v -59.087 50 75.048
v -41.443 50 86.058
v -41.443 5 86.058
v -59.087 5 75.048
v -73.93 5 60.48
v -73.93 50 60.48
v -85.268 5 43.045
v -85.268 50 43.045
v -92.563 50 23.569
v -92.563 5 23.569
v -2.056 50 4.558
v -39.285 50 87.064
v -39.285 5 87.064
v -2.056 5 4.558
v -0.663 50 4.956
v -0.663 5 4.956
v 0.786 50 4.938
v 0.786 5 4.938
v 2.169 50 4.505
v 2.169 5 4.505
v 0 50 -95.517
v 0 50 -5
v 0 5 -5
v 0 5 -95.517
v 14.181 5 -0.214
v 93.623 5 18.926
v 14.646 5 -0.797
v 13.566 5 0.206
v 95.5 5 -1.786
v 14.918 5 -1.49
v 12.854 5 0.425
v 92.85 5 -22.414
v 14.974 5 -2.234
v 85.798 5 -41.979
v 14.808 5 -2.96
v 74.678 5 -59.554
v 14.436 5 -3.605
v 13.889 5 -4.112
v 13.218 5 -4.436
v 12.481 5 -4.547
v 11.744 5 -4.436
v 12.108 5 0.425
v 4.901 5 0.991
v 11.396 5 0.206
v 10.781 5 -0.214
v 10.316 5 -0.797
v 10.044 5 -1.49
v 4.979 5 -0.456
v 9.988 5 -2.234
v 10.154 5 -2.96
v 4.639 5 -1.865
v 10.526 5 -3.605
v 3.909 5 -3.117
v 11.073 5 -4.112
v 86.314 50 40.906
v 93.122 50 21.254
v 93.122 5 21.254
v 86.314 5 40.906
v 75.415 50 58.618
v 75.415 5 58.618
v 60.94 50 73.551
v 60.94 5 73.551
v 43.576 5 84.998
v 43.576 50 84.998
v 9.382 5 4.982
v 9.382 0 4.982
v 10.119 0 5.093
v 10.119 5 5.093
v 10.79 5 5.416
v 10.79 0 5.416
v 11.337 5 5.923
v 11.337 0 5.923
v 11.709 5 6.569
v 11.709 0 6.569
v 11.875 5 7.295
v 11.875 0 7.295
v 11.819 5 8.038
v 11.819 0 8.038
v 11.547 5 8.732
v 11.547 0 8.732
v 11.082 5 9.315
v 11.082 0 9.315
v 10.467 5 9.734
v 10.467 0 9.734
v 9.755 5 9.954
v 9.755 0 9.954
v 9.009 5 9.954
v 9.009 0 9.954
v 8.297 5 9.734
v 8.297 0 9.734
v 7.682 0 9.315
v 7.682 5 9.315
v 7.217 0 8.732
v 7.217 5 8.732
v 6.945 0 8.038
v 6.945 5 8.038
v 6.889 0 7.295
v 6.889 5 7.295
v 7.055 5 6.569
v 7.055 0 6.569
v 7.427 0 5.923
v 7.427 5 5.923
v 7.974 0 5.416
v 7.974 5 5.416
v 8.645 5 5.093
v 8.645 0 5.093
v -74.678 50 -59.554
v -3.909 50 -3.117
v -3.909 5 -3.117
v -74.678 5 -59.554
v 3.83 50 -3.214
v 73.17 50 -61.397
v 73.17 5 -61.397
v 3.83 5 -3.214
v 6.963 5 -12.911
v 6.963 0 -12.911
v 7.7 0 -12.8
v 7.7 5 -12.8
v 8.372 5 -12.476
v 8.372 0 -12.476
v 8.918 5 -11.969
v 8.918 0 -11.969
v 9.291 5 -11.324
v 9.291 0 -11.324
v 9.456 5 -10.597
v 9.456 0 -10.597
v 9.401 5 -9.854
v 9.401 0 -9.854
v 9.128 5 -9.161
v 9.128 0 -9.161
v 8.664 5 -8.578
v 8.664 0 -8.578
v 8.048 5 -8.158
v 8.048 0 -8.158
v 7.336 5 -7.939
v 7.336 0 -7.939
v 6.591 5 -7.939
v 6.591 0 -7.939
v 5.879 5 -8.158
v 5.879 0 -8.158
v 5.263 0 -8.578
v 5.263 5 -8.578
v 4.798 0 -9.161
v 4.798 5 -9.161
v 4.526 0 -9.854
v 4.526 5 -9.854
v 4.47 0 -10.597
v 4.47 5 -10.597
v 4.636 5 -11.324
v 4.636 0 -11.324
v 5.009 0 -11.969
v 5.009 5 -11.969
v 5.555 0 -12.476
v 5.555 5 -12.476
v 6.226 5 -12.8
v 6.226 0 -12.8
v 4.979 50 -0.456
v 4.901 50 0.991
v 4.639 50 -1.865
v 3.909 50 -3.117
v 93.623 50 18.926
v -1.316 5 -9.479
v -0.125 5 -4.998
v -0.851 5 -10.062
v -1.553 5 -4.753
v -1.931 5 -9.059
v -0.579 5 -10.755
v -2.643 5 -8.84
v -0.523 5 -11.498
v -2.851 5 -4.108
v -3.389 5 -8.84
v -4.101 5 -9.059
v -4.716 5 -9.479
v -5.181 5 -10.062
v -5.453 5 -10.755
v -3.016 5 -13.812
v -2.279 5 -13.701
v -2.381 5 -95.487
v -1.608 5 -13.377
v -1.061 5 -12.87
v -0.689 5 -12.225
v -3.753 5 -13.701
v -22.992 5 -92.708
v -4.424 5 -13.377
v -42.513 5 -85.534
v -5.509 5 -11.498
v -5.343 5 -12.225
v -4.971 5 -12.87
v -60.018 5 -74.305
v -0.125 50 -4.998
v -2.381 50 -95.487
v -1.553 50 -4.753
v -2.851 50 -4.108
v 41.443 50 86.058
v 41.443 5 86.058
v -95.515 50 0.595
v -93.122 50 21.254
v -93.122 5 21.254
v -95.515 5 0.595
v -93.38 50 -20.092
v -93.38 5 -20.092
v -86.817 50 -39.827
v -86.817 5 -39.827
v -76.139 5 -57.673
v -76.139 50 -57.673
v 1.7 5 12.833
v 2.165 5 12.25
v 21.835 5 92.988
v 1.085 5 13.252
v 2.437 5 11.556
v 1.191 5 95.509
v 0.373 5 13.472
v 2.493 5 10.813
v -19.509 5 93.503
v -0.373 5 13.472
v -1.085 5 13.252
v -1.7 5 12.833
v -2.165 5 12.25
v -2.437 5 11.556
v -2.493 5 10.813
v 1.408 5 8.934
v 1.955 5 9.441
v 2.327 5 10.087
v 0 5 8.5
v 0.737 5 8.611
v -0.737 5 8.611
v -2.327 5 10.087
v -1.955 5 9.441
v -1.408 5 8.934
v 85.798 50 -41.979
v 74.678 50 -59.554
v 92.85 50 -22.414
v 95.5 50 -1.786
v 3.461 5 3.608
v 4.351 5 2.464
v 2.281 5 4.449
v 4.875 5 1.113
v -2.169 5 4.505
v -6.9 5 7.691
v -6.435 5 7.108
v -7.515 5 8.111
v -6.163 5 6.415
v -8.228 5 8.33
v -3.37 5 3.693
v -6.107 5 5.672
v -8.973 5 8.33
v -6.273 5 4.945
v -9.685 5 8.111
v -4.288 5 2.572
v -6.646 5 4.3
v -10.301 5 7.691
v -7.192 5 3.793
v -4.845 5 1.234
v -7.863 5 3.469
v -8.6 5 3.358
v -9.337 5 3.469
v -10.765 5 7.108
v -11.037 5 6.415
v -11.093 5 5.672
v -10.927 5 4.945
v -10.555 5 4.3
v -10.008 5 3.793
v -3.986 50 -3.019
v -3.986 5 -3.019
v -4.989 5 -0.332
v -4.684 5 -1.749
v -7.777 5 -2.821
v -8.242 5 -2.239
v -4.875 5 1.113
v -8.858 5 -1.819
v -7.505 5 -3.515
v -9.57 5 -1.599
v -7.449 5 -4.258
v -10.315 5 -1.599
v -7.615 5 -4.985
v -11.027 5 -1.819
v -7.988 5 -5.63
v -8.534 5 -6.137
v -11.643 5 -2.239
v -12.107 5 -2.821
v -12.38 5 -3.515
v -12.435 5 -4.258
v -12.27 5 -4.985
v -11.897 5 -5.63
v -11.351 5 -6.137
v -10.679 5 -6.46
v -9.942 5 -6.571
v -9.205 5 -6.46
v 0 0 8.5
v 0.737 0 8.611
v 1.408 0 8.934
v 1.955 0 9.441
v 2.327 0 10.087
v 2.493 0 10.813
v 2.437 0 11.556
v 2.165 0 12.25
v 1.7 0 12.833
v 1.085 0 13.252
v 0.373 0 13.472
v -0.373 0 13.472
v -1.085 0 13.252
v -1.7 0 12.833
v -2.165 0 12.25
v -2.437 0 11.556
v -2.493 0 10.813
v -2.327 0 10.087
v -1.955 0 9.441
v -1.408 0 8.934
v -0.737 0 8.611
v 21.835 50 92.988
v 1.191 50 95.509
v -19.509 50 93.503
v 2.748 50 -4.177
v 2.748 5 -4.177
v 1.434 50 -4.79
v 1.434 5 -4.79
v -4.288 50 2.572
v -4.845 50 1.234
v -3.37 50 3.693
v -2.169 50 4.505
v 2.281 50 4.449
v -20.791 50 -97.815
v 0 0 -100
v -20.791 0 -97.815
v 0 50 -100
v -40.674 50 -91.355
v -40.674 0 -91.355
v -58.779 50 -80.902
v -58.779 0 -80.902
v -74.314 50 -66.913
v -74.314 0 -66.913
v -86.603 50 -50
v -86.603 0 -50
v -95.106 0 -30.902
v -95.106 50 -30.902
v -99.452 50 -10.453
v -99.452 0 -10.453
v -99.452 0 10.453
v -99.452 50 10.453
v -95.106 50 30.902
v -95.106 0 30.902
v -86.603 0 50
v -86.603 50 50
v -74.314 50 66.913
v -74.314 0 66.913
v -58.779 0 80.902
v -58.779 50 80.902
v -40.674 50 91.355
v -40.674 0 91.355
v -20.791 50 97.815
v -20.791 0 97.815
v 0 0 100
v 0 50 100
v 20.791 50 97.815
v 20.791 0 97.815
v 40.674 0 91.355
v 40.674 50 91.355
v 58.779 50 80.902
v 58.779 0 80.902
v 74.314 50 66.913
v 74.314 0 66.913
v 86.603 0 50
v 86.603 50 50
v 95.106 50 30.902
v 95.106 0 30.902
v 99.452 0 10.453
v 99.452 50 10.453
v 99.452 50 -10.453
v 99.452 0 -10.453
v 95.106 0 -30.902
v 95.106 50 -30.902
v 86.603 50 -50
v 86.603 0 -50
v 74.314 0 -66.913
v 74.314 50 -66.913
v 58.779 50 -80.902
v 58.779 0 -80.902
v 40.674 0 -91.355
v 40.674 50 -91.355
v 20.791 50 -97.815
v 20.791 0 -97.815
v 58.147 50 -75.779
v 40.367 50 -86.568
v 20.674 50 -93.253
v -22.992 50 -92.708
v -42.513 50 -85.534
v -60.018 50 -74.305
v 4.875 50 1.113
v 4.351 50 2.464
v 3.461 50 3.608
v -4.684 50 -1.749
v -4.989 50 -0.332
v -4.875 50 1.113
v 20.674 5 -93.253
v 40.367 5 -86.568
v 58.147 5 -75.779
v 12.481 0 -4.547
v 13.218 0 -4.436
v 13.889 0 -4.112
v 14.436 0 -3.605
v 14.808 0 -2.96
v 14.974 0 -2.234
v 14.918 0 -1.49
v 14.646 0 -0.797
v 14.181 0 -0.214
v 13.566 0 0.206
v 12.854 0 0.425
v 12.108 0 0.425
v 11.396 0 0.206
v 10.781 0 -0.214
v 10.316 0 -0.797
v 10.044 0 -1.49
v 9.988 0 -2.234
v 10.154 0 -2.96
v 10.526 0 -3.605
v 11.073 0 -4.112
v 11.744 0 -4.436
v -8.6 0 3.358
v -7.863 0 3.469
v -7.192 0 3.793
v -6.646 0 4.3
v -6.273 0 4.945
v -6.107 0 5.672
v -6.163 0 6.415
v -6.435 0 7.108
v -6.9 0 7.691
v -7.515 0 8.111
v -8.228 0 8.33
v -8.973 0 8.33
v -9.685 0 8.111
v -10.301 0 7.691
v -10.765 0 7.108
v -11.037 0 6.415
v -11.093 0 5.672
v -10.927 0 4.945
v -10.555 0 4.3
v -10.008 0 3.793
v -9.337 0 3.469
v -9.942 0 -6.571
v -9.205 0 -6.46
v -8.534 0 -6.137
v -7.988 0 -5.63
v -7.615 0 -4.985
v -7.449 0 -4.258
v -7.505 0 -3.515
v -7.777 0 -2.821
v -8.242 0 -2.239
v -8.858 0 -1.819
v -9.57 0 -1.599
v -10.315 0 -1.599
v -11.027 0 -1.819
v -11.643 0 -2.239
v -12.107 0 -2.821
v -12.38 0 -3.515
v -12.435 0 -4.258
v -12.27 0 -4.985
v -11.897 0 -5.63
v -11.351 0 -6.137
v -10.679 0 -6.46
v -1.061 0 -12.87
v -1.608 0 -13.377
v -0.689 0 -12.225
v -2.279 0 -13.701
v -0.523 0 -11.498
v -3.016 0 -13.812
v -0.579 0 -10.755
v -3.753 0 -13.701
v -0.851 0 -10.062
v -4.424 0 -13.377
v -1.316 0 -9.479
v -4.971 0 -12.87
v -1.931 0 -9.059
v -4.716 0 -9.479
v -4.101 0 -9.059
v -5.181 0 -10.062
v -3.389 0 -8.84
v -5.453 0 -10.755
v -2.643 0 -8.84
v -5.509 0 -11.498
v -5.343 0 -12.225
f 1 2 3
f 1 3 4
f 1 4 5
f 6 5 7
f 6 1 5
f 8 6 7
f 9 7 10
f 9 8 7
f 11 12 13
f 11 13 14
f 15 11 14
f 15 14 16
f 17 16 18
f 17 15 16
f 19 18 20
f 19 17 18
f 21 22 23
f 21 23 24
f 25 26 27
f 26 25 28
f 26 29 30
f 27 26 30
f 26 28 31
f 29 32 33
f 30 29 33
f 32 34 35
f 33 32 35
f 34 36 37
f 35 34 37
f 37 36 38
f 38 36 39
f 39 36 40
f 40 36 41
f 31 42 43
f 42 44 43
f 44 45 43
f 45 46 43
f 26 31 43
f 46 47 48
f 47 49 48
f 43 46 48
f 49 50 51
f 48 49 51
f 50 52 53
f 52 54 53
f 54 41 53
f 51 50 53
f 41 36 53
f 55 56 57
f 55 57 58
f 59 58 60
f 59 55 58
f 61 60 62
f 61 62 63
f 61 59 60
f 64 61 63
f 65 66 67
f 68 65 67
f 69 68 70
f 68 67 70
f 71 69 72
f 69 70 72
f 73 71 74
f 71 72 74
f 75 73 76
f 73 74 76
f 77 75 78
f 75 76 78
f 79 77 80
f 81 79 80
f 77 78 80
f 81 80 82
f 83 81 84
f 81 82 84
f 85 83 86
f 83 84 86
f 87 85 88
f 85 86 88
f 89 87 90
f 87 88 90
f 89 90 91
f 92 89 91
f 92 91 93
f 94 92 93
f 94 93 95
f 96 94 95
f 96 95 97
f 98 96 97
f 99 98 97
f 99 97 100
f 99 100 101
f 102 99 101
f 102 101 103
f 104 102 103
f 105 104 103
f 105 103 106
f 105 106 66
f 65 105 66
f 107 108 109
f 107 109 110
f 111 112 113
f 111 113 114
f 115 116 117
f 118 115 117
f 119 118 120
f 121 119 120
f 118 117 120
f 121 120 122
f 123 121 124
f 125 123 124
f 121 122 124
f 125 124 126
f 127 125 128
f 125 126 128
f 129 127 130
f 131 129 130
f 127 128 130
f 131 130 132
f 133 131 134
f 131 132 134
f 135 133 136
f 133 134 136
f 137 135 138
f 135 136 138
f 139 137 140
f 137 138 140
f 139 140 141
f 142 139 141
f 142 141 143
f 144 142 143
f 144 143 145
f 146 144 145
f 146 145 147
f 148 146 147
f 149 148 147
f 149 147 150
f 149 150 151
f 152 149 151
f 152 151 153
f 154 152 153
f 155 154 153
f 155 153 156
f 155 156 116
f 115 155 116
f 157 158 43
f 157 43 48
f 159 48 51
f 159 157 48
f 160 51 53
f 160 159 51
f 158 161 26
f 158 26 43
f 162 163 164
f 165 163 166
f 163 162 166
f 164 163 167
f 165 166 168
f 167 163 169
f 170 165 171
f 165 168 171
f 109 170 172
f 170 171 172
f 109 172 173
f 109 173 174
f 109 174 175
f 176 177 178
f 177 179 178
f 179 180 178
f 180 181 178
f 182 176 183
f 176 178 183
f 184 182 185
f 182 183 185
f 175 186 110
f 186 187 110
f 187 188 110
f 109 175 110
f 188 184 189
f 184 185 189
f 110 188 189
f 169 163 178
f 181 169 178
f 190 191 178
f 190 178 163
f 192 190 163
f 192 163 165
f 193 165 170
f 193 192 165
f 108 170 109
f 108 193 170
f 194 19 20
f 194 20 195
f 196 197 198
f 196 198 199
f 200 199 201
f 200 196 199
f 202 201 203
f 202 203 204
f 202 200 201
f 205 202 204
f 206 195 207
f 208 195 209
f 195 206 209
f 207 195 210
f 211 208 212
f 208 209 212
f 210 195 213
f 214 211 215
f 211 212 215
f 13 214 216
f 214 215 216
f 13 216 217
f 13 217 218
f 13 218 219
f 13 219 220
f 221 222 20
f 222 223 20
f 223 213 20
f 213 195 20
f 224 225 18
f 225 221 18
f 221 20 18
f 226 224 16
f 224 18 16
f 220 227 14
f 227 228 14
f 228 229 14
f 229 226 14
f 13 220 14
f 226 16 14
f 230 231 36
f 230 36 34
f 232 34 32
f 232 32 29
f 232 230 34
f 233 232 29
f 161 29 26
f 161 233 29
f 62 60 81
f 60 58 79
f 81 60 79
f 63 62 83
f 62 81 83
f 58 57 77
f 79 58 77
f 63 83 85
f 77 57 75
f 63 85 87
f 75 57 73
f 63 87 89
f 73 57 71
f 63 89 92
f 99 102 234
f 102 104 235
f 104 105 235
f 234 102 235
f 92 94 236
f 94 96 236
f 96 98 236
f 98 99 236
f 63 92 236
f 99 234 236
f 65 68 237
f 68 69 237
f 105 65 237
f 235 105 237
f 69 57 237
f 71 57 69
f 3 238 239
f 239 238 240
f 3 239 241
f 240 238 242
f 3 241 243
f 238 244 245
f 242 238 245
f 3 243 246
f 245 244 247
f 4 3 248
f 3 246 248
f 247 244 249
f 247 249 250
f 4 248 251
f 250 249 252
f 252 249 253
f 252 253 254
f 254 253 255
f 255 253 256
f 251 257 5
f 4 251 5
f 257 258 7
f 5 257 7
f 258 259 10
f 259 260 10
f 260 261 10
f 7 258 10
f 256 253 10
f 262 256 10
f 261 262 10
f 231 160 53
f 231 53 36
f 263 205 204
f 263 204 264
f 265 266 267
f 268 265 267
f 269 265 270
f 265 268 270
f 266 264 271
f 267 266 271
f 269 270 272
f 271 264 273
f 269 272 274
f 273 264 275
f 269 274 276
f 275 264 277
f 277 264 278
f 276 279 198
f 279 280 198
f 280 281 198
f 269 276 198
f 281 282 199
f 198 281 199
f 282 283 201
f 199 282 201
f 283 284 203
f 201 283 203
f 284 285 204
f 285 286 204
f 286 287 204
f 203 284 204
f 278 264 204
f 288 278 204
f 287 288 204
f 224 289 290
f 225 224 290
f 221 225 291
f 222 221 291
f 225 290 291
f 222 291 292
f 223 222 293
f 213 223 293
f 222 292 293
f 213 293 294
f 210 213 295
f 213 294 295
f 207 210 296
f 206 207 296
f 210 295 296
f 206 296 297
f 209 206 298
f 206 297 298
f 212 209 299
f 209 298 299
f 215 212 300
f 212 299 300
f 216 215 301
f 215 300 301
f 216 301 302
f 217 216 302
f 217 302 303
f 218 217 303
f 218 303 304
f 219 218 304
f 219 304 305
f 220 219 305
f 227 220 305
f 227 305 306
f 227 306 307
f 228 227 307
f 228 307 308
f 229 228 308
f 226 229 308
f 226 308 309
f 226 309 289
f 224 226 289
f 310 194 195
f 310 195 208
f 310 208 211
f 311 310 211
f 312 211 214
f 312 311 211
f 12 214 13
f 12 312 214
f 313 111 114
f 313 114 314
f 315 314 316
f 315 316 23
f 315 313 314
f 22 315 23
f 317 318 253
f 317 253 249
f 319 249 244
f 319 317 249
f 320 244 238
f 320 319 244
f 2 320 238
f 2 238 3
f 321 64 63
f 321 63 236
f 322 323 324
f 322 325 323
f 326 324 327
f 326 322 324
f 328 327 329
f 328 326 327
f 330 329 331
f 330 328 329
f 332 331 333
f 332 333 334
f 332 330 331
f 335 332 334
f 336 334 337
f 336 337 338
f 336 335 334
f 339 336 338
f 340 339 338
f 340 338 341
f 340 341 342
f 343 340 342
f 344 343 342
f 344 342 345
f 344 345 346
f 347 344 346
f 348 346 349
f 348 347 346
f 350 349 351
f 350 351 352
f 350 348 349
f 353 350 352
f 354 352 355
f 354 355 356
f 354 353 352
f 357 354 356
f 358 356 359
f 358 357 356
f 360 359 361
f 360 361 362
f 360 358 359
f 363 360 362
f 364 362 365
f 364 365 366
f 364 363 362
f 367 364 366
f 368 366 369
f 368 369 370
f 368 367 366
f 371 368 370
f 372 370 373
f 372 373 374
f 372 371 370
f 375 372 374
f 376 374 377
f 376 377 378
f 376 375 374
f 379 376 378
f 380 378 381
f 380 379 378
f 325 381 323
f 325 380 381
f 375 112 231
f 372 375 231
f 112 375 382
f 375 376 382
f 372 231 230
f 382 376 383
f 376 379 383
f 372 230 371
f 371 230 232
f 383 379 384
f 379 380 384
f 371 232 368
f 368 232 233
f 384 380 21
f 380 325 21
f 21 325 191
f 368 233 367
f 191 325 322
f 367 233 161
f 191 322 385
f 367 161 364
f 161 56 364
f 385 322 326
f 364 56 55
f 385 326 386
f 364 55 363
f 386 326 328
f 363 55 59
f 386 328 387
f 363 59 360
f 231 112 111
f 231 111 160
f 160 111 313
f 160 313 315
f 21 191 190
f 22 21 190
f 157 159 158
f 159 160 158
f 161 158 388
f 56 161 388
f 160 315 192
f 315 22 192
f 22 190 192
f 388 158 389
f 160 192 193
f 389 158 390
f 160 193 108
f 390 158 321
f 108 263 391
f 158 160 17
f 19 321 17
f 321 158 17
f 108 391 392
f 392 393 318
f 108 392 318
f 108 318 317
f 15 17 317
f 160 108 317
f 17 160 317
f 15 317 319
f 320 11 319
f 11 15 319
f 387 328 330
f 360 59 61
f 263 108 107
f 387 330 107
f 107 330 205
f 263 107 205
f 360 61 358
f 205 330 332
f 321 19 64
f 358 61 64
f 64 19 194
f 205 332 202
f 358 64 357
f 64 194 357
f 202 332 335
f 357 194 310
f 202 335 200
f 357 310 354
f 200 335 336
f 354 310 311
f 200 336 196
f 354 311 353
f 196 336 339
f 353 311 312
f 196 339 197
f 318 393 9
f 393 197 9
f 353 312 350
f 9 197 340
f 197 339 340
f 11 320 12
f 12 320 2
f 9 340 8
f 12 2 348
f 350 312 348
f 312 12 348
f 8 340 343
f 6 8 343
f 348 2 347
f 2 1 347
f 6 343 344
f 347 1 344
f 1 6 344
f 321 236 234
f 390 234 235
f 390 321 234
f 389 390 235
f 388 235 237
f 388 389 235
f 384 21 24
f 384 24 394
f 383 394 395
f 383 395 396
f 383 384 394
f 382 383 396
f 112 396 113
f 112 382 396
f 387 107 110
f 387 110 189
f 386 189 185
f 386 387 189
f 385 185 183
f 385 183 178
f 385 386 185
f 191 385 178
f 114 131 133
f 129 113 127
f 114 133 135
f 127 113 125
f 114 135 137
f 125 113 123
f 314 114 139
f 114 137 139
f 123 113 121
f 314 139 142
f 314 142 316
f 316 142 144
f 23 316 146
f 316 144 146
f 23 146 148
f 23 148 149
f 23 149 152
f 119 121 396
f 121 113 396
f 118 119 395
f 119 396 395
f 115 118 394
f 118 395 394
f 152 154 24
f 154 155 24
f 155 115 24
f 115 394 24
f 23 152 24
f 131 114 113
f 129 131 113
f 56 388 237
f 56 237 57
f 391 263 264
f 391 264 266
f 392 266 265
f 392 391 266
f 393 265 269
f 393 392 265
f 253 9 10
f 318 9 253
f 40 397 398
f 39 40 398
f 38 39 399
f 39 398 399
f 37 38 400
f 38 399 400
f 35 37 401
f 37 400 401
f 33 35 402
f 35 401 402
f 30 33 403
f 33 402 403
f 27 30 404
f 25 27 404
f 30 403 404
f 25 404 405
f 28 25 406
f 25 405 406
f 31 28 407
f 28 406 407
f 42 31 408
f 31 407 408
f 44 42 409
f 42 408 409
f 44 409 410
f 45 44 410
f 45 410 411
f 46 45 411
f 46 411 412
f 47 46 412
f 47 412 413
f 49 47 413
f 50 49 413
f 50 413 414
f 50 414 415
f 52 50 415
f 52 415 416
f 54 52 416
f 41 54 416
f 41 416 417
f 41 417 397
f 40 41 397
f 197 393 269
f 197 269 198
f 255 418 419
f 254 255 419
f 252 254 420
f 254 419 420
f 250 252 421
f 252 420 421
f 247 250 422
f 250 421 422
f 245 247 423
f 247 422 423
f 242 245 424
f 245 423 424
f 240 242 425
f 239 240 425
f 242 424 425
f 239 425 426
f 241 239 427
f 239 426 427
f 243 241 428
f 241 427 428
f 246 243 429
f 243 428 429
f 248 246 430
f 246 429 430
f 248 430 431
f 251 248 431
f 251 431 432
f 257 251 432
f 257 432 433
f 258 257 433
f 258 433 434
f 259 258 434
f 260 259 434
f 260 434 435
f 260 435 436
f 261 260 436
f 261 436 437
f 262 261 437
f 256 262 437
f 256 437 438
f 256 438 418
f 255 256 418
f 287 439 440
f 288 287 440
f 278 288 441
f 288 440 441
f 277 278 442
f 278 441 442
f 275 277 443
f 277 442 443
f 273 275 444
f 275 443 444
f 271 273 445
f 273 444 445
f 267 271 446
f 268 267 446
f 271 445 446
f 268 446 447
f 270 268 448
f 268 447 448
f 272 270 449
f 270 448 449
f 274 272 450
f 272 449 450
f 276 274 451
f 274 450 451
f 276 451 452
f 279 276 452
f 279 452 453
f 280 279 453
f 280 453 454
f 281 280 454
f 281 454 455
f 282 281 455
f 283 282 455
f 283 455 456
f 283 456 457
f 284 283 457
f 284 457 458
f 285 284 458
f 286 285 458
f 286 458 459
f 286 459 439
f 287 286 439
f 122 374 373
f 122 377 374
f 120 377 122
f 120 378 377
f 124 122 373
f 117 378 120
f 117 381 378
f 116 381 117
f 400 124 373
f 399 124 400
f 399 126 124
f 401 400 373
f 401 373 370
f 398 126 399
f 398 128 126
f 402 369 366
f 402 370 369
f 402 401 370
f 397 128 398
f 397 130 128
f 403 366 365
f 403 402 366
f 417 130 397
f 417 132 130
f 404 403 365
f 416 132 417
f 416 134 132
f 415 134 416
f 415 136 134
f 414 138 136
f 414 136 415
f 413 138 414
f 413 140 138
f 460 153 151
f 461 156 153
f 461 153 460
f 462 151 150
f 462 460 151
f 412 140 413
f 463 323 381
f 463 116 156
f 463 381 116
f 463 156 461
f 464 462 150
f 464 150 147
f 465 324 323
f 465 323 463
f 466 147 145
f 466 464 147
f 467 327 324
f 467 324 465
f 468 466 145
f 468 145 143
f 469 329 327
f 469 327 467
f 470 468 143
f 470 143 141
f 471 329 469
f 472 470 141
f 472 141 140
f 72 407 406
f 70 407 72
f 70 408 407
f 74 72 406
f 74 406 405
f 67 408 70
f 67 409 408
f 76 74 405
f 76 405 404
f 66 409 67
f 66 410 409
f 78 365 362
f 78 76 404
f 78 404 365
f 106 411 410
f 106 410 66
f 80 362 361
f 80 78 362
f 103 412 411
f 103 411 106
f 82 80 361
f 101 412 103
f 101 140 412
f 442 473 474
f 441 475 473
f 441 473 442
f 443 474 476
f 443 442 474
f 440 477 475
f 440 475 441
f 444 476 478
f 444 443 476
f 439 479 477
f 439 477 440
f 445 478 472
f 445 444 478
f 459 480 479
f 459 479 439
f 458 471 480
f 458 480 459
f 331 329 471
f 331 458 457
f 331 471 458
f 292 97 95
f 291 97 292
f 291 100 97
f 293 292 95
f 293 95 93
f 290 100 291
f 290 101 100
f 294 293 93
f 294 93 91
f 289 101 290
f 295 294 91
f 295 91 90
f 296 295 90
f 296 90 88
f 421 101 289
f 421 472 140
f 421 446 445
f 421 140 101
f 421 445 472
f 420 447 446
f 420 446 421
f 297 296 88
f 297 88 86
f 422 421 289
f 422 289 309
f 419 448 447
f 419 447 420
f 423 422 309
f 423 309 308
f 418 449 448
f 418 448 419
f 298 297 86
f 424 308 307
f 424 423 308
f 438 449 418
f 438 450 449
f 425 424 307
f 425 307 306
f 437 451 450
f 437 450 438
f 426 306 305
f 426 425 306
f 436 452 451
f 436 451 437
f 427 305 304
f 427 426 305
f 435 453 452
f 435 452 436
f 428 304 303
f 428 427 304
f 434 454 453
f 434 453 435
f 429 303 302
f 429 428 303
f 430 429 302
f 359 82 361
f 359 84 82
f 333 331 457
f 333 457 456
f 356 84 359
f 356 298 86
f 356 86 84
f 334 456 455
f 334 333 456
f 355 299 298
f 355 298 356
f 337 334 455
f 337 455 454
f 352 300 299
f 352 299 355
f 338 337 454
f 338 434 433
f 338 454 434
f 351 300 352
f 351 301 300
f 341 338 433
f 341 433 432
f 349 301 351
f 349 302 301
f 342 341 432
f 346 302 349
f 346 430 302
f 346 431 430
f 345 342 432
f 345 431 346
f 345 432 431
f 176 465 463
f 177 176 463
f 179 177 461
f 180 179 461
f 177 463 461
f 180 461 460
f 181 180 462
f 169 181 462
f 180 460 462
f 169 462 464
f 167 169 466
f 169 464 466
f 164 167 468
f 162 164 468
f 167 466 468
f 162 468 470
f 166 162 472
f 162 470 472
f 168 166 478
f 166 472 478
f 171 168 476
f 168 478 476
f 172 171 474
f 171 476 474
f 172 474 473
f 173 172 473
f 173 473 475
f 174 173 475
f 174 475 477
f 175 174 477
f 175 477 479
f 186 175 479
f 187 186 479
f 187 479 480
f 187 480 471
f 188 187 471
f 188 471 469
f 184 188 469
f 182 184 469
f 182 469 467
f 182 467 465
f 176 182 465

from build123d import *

# Parameters (mm, degrees)
SKETCH1_W          = 100
SKETCH1_H          = 50
CUT_EXTRUDE4_DEPTH = 45
SKETCH3_R          = 2.5
CUT_EXTRUDE5_DEPTH = 10


with BuildPart() as part:
    # Sketch1 → Revolve1 (revolve)
    with BuildSketch(Plane.XY, mode=Mode.PRIVATE) as revolve1_sk:
        with Locations((50, 25)):
            Rectangle(SKETCH1_W, SKETCH1_H)
    revolve(revolve1_sk.sketch.rotate(Axis((0, 0, 0), (0, 1, 0)), 90), axis=Axis((0, 0, 0), (0, 1, 0)))

    # Sketch2 → Cut-Extrude4 (cut)
    with BuildSketch(Plane(origin=(0, 50, 0), x_dir=(1, 0, 0), z_dir=(0, 1, 0))):
        with BuildLine():
            Line((0, 5), (0, 95.51671112))
            ThreePointArc((0, 95.51671112), (40.367106421, 86.56753908), (73.170045778, 61.396958426))
            Line((73.170045778, 61.396958426), (3.830222216, 3.213938048))
            ThreePointArc((3.830222216, 3.213938048), (2.113091309, 4.531538935), (0, 5))
        make_face()
        with BuildLine():
            Line((3.909157412, 3.117449009), (74.677971855, 59.55369529))
            ThreePointArc((74.677971855, 59.55369529), (92.849706596, 22.413703133), (93.62285237, -18.92626792))
            Line((93.62285237, -18.92626792), (4.900862439, -0.990730716))
            ThreePointArc((4.900862439, -0.990730716), (4.860390685, 1.173287002), (3.909157412, 3.117449009))
        make_face()
        with BuildLine():
            Line((4.874639561, -1.11260467), (93.121907751, -21.254467767))
            ThreePointArc((93.121907751, -21.254467767), (75.414583916, -58.61810843), (43.575741568, -84.997628496))
            Line((43.575741568, -84.997628496), (2.281053287, -4.449359044))
            ThreePointArc((2.281053287, -4.449359044), (3.947716742, -3.068473974), (4.874639561, -1.11260467))
        make_face()
        with BuildLine():
            Line((2.169418696, -4.50484434), (41.443147769, -86.057583084))
            ThreePointArc((41.443147769, -86.057583084), (1.19074137, -95.509288753), (-39.284791417, -87.064041179))
            Line((-39.284791417, -87.064041179), (-2.056435516, -4.557529262))
            ThreePointArc((-2.056435516, -4.557529262), (0.062331573, -4.999611462), (2.169418696, -4.50484434))
        make_face()
        with BuildLine():
            Line((-2.169418696, -4.50484434), (-41.443147769, -86.057583084))
            ThreePointArc((-41.443147769, -86.057583084), (-73.929753715, -60.480026611), (-92.563075202, -23.569455072))
            Line((-92.563075202, -23.569455072), (-4.845386431, -1.233786988))
            ThreePointArc((-4.845386431, -1.233786988), (-3.869990541, -3.165939546), (-2.169418696, -4.50484434))
        make_face()
        with BuildLine():
            Line((-4.874639561, -1.11260467), (-93.121907751, -21.254467767))
            ThreePointArc((-93.121907751, -21.254467767), (-93.37963636, 20.091929137), (-76.139475417, 57.673411434))
            Line((-76.139475417, 57.673411434), (-3.985662536, 3.019022052))
            ThreePointArc((-3.985662536, 3.019022052), (-4.888130845, 1.051749422), (-4.874639561, -1.11260467))
        make_face()
        with BuildLine():
            Line((-3.909157412, 3.117449009), (-74.677971855, 59.55369529))
            ThreePointArc((-74.677971855, 59.55369529), (-42.512748229, 85.534252444), (-2.381297681, 95.487022807))
            Line((-2.381297681, 95.487022807), (-0.124653459, 4.99844591))
            ThreePointArc((-0.124653459, 4.99844591), (-2.225408922, 4.477449623), (-3.909157412, 3.117449009))
        make_face()
    extrude(amount=-CUT_EXTRUDE4_DEPTH, mode=Mode.SUBTRACT)

    # Sketch3 → Cut-Extrude5 (cut)
    with BuildSketch(Plane.XZ):
        with Locations(Location((0, 11, 0), (0, 0, 270))):
            Circle(SKETCH3_R)
        with Locations(Location((9.38197779, 7.481877622, 0), (0, 0, 270))):
            Circle(SKETCH3_R)
        with Locations(Location((12.480966429, -2.046761406, 0), (0, 0, 270))):
            Circle(SKETCH3_R)
        with Locations(Location((6.963364264, -10.410657547, 0), (0, 0, 270))):
            Circle(SKETCH3_R)
        with Locations(Location((-3.015961736, -11.311626415, 0), (0, 0, 270))):
            Circle(SKETCH3_R)
        with Locations(Location((-9.942375552, -4.071220075, 0), (0, 0, 270))):
            Circle(SKETCH3_R)
        with Locations(Location((-8.600146307, 5.85838782, 0), (0, 0, 270))):
            Circle(SKETCH3_R)
    extrude(amount=-CUT_EXTRUDE5_DEPTH, mode=Mode.SUBTRACT)


solid = part.part
